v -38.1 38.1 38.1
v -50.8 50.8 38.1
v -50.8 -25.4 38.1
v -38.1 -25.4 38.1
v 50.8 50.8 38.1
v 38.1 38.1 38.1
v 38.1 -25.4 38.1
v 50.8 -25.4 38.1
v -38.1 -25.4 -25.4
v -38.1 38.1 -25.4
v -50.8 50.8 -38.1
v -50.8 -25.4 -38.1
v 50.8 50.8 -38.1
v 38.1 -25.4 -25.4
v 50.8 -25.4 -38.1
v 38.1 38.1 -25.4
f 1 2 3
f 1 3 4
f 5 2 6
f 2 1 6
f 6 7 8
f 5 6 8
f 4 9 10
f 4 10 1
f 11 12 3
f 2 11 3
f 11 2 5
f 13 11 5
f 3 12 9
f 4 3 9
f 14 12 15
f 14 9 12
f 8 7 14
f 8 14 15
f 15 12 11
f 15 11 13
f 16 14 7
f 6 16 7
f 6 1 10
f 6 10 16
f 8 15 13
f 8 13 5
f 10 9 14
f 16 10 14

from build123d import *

# Parameters (mm, degrees)
F0_W          = 101.6
F0_H          = 76.2
F1_DEPTH      = 50.8
F1_DEPTH_BACK = 50.8
F2_T          = -12.7
F1_FACE_W     = 101.6
F1_FACE_H     = 76.2
F3_DEPTH      = 25.4


with BuildPart() as f1:
    # F0 (on Front) → F1 (new body, two sides)
    with BuildSketch(Plane.XZ) as f1_sk:
        Rectangle(F0_W, F0_H)
    extrude(amount=F1_DEPTH)
    extrude(f1_sk.sketch, amount=-F1_DEPTH_BACK)

    # F2
    f2_openings = [f1.faces().sort_by_distance(p)[0] for p in [
        (0, 0, 38.1),
    ]]
    offset(amount=F2_T, openings=f2_openings)

    # F1_face (on face) → F3 (cut)
    with BuildSketch(Plane.XZ.offset(50.8)):
        Rectangle(F1_FACE_W, F1_FACE_H)
    extrude(amount=-F3_DEPTH, mode=Mode.SUBTRACT)


solid = f1.part
